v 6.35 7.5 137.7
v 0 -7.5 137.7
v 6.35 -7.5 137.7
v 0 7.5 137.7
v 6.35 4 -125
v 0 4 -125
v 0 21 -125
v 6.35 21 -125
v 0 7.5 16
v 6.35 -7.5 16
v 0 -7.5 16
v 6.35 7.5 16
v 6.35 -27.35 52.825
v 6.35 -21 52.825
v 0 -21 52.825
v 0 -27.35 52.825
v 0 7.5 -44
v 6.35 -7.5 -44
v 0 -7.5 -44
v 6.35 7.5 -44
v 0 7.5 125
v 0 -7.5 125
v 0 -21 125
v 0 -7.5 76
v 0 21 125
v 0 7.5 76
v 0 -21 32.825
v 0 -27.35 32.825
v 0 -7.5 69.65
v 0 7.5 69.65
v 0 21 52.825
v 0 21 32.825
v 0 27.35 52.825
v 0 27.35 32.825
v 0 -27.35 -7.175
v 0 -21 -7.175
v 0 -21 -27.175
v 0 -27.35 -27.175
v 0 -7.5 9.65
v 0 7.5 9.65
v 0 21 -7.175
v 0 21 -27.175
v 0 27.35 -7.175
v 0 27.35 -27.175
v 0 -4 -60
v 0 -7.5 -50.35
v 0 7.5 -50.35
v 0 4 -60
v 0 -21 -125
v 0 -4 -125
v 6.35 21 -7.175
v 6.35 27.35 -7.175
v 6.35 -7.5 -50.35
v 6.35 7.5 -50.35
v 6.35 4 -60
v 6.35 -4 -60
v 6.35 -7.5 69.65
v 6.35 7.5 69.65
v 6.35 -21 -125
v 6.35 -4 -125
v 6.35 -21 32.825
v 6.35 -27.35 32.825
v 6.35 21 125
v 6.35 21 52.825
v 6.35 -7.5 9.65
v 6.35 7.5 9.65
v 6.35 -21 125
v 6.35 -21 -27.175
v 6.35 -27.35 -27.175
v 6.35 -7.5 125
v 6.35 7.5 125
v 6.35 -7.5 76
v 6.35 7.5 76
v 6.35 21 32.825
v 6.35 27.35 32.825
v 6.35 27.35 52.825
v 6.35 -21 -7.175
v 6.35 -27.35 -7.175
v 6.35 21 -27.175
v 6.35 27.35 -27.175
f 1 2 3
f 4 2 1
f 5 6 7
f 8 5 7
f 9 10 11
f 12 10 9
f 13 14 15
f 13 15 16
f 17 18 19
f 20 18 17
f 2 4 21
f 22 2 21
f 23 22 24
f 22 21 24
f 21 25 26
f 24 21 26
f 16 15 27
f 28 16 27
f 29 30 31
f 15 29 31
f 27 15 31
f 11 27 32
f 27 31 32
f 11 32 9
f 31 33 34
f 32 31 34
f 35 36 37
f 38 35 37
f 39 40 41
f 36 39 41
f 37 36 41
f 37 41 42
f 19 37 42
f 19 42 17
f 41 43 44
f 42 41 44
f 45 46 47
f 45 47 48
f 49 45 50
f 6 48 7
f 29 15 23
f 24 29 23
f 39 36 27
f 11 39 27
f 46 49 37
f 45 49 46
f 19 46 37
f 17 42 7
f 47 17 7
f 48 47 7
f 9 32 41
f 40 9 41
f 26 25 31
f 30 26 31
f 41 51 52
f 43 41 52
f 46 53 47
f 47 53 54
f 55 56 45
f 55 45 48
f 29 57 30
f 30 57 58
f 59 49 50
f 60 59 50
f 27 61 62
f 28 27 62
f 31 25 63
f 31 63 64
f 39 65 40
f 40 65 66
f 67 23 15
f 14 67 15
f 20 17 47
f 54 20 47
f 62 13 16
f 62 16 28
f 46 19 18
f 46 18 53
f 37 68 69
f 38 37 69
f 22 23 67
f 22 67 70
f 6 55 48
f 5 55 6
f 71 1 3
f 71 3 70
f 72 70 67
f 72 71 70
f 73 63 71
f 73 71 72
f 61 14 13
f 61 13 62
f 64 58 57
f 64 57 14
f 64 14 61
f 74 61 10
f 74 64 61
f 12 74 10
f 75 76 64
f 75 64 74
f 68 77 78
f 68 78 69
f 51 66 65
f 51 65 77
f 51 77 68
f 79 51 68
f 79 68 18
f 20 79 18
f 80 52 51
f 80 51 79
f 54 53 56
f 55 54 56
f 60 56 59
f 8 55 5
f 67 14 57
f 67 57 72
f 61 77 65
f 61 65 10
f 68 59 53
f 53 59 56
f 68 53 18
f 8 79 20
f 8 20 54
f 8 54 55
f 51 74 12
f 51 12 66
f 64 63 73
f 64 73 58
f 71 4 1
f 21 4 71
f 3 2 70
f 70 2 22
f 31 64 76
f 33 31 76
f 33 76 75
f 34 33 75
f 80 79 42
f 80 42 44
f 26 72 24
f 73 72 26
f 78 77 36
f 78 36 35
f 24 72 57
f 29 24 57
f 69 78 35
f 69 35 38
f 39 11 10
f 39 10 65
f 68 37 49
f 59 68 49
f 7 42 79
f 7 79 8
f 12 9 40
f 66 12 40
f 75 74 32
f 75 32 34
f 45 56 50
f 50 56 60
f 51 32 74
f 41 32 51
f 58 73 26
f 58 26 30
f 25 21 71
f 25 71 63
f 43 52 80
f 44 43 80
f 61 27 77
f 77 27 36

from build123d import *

# Parameters (mm, degrees)
SKETCH1_W           = 250
SKETCH1_H           = 42
SKETCH1_W_2         = 12.7
SKETCH1_H_2         = 15
BOSS_EXTRUDE1_DEPTH = 6.35
SKETCH2_W           = 6.35
SKETCH2_H           = 15
CUT_EXTRUDE1_DEPTH  = 140.436768824
LPATTERN1_COUNT     = 3
LPATTERN1_PITCH     = 60
SKETCH3_W           = 65
SKETCH3_H           = 8
CUT_EXTRUDE2_DEPTH  = 140.436768824
SKETCH4_W           = 20
SKETCH4_H           = 6.35
BOSS_EXTRUDE2_DEPTH = 6.35


with BuildPart() as part:
    # Sketch1 → Boss-Extrude1 (new body)
    with BuildSketch(Plane(origin=(0, 0, 0), x_dir=(0, 0, -1), z_dir=(1, 0, 0))):
        Rectangle(SKETCH1_W, SKETCH1_H)
        with Locations((-131.35, 0)):
            Rectangle(SKETCH1_W_2, SKETCH1_H_2)
    extrude(amount=BOSS_EXTRUDE1_DEPTH)

    # Sketch2 → Cut-Extrude1 (cut, through all)
    with BuildSketch(Plane(origin=(6.35, 0, 0), x_dir=(0, 0, -1), z_dir=(1, 0, 0))):
        with Locations((-72.825, 0)):
            Rectangle(SKETCH2_W, SKETCH2_H)
    cut_extrude1 = extrude(amount=-CUT_EXTRUDE1_DEPTH, mode=Mode.SUBTRACT)

    # LPattern1: Cut-Extrude1 ×3
    with Locations(*[(0, 0, -i * LPATTERN1_PITCH) for i in range(1, LPATTERN1_COUNT)]):
        add(cut_extrude1, mode=Mode.SUBTRACT)

    # Sketch3 → Cut-Extrude2 (cut, through all)
    with BuildSketch(Plane(origin=(6.35, 0, 0), x_dir=(0, 0, -1), z_dir=(1, 0, 0))):
        with Locations((92.5, 0)):
            Rectangle(SKETCH3_W, SKETCH3_H)
    extrude(amount=-CUT_EXTRUDE2_DEPTH, mode=Mode.SUBTRACT)

    # Sketch4 → Boss-Extrude2 (add)
    with BuildSketch(Plane(origin=(6.35, 0, 0), x_dir=(0, 0, -1), z_dir=(1, 0, 0))):
        with Locations((-42.825, 24.175)):
            Rectangle(SKETCH4_W, SKETCH4_H)
        with Locations((17.175, 24.175)):
            Rectangle(SKETCH4_W, SKETCH4_H)
    boss_extrude2 = extrude(amount=-BOSS_EXTRUDE2_DEPTH)

    # Mirror1: Boss-Extrude2 across plane
    add(boss_extrude2.mirror(Plane.ZX))


solid = part.part
